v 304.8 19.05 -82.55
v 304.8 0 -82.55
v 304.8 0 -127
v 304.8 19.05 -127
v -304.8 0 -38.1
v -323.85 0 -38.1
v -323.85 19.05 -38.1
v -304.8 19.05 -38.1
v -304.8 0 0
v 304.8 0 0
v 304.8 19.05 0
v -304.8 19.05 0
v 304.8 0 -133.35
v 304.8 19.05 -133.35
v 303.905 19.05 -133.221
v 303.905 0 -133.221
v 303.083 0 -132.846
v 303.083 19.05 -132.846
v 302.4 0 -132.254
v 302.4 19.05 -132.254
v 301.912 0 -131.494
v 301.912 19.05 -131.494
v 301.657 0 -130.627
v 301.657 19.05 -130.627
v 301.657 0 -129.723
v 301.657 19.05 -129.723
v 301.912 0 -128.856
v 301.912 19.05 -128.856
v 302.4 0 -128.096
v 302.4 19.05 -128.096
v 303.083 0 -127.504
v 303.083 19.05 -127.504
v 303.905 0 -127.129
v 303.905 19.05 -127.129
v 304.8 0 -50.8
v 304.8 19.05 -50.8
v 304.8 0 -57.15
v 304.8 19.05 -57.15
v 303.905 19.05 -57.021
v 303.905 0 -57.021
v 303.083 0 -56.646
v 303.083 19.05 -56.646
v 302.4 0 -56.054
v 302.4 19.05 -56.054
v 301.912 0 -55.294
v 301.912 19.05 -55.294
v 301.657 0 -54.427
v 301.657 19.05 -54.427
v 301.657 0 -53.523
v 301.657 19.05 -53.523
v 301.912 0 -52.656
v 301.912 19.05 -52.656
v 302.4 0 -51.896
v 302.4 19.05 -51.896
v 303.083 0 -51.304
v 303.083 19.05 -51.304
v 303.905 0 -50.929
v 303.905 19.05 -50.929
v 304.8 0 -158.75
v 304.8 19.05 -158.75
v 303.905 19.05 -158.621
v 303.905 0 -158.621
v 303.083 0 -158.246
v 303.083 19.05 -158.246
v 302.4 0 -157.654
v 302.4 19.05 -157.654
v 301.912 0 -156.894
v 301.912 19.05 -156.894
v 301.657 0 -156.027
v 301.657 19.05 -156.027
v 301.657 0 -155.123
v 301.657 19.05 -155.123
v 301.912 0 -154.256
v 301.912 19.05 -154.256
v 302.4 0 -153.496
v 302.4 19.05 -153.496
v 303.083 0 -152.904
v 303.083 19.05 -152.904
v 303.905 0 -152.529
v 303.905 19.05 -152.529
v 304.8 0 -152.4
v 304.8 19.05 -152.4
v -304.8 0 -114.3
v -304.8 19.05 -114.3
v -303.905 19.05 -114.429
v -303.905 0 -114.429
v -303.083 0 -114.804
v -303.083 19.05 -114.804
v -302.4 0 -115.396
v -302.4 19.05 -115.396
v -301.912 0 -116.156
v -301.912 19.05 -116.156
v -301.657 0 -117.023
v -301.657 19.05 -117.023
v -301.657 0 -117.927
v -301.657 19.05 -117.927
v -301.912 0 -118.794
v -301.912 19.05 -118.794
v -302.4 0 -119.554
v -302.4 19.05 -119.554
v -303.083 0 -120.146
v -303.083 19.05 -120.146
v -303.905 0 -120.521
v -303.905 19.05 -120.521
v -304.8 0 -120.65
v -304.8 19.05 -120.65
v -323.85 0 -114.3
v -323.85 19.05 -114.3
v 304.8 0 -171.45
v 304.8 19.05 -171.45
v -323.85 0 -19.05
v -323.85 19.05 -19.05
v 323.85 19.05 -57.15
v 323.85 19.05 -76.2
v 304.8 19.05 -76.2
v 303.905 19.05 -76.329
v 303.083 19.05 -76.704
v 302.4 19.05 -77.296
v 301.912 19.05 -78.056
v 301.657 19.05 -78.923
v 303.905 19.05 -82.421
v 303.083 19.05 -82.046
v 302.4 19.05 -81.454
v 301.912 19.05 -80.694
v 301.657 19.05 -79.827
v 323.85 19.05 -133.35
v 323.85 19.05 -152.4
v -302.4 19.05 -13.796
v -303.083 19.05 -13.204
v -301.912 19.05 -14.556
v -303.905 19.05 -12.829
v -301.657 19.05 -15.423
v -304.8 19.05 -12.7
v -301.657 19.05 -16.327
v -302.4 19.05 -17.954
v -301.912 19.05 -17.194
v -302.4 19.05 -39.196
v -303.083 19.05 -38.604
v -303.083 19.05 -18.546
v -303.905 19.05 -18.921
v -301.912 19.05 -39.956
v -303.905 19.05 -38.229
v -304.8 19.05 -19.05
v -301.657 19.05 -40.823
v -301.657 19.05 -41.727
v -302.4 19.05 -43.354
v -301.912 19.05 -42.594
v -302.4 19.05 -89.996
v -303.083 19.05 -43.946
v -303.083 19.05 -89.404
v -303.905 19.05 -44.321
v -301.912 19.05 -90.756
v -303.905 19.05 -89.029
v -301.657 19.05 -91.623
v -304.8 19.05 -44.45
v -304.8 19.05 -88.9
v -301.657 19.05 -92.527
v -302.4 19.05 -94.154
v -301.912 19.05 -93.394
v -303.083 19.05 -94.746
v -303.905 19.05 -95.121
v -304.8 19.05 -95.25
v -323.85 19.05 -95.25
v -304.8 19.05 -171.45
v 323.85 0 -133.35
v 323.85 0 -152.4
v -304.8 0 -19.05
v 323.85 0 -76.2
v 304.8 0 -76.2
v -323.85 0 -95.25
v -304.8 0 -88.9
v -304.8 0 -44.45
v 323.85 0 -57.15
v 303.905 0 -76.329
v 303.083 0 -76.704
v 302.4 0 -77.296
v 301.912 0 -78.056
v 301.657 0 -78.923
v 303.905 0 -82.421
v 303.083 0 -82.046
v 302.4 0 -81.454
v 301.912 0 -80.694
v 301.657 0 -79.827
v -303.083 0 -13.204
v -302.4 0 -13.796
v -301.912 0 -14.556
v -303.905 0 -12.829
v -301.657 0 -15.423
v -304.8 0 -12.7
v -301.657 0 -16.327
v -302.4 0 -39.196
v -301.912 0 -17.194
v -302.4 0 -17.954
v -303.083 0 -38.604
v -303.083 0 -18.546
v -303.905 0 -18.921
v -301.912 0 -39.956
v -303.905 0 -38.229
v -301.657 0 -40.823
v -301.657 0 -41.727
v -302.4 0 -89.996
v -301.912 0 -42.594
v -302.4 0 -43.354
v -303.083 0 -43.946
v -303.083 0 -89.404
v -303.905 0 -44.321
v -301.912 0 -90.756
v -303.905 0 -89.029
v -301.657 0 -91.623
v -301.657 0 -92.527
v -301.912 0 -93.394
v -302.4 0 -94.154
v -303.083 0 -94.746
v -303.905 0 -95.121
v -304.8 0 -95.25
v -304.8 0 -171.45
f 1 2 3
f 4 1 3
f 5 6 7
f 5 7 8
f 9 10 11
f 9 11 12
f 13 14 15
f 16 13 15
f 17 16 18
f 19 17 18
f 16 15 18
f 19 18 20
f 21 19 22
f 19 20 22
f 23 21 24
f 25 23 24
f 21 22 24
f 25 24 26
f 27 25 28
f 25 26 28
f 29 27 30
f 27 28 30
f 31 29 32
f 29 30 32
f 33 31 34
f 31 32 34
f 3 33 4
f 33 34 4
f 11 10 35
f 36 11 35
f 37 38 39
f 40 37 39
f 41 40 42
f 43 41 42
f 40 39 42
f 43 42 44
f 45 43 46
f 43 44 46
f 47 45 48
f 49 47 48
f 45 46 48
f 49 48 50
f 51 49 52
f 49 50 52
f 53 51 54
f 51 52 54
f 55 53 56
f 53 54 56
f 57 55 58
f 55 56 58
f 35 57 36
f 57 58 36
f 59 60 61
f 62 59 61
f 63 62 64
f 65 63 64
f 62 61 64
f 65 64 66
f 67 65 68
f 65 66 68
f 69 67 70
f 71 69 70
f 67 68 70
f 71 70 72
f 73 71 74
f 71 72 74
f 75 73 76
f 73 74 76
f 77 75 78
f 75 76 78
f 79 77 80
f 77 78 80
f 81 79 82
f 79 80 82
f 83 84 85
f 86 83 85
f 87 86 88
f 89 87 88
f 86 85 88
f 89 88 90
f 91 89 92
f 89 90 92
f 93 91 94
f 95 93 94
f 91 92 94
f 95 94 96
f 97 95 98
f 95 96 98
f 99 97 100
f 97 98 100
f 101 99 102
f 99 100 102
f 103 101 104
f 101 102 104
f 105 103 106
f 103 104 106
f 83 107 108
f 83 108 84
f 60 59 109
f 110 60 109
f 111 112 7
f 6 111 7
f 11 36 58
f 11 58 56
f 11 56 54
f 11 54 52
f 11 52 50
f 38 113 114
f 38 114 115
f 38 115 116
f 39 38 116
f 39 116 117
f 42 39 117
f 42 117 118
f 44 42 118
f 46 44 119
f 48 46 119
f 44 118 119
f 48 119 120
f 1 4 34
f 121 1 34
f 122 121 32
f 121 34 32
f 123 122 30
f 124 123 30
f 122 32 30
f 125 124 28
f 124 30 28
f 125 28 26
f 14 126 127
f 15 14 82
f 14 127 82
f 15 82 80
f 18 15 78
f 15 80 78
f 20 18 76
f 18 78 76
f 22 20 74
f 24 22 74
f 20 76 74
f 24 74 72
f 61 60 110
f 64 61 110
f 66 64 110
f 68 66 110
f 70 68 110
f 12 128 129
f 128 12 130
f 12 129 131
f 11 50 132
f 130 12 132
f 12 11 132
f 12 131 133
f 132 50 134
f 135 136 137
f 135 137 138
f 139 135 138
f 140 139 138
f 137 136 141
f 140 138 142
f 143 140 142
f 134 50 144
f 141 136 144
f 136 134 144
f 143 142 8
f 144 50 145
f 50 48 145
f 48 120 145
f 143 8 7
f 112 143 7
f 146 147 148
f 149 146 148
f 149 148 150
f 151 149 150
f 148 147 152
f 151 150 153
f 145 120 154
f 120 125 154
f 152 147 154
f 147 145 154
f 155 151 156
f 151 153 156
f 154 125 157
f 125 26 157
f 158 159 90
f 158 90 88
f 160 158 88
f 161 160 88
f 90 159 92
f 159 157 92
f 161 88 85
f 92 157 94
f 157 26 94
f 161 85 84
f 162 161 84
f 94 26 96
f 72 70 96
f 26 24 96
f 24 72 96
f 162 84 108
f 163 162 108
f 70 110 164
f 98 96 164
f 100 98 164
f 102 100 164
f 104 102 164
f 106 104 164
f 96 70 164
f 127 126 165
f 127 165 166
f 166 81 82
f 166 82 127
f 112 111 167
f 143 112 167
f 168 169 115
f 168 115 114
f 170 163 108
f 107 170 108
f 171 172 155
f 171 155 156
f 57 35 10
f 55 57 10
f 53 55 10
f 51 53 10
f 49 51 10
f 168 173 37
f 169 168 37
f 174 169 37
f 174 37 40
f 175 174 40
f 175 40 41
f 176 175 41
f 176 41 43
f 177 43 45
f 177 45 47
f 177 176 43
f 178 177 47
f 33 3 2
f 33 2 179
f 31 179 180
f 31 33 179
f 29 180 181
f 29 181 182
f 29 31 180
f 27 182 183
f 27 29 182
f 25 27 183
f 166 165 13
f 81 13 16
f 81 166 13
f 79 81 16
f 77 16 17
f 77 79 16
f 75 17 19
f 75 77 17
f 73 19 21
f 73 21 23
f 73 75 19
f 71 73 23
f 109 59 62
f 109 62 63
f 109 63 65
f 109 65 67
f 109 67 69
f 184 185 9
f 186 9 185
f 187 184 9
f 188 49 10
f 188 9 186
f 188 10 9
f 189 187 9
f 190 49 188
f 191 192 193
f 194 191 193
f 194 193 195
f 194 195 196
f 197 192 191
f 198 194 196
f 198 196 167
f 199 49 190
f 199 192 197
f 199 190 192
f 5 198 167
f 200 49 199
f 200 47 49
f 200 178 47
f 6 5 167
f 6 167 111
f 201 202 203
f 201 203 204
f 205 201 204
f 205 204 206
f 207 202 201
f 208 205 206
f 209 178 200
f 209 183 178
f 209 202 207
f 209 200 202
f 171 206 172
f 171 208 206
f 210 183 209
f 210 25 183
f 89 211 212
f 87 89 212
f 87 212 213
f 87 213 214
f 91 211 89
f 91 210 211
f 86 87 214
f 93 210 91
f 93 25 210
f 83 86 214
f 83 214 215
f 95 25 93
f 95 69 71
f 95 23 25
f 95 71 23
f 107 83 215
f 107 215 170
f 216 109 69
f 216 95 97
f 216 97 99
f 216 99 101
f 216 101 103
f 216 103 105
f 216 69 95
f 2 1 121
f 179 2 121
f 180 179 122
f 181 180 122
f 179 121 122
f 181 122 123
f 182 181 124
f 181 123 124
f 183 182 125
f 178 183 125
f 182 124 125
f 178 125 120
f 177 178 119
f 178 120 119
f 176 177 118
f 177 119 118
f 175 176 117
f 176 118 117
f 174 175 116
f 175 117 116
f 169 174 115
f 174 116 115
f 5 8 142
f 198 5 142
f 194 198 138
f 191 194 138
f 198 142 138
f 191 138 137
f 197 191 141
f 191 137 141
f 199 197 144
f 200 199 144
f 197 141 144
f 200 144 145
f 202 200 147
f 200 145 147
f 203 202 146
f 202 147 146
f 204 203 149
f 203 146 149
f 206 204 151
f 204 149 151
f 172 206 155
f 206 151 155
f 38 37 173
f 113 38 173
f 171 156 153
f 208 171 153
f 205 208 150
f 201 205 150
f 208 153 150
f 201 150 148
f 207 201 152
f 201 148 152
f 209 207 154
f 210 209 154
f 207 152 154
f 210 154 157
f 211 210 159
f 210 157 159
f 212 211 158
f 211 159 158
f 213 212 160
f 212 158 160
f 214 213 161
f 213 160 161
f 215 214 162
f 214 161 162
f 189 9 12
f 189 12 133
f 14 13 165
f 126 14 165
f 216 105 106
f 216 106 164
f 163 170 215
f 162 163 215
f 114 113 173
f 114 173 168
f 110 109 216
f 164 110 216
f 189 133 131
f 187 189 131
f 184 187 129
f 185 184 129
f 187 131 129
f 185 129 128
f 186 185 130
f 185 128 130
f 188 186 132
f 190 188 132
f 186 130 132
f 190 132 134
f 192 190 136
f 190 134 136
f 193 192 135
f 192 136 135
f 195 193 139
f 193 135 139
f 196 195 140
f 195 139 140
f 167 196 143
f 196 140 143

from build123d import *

# Parameters (mm, degrees)
SKETCH1_W               = 304.8
SKETCH1_H               = 171.45
BOSS_EXTRUDE1_DEPTH     = 19.05
SKETCH2_W               = 19.05
SKETCH2_H               = 19.05
BOSS_EXTRUDE2_DEPTH     = 19.05
SKETCH3_W               = 19.05
SKETCH3_H               = 19.05
CUT_EXTRUDE1_DEPTH      = 367.928913415
CUT_EXTRUDE2_DEPTH      = 367.928913415
CUT_EXTRUDE2_DEPTH_BACK = 367.928913415
CUT_EXTRUDE3_DEPTH      = 367.928913415
CUT_EXTRUDE3_DEPTH_BACK = 367.928913415
CUT_EXTRUDE4_DEPTH      = 367.928913415
SKETCH9_W               = 241.3
SKETCH9_H               = 171.45
BOSS_EXTRUDE3_DEPTH     = 19.05


with BuildPart() as part:
    # Sketch1 → Boss-Extrude1 (new body)
    with BuildSketch(Plane(origin=(0, 0, 0), x_dir=(1, 0, 0), z_dir=(0, 1, 0))):
        with Locations((-152.4, 85.725)):
            Rectangle(SKETCH1_W, SKETCH1_H)
    extrude(amount=BOSS_EXTRUDE1_DEPTH)

    # Mirror1: part across plane


with BuildPart() as part_1:
    add(part.part)
    add(part.part.mirror(Plane(origin=(0, 19.05, 0), x_dir=(0, 0, 1), z_dir=(-1, 0, 0))))

    # Sketch2 → Boss-Extrude2 (add)
    with BuildSketch(Plane(origin=(0, 19.05, 0), x_dir=(1, 0, 0), z_dir=(0, 1, 0))):
        with Locations((-314.325, 28.575)):
            Rectangle(SKETCH2_W, SKETCH2_H)
        with Locations((-314.325, 104.775)):
            Rectangle(SKETCH2_W, SKETCH2_H)
        with Locations((314.325, 142.875)):
            Rectangle(SKETCH2_W, SKETCH2_H)
        with Locations((314.325, 66.675)):
            Rectangle(SKETCH2_W, SKETCH2_H)
    extrude(amount=-BOSS_EXTRUDE2_DEPTH)

    # Sketch3 → Cut-Extrude1 (cut, symmetric)
    with BuildSketch(Plane(origin=(0, 19.05, 0), x_dir=(1, 0, 0), z_dir=(0, 1, 0))):
        with Locations((-104.775, 9.525)):
            Rectangle(SKETCH3_W, SKETCH3_H)
        with Locations((-104.775, 161.925)):
            Rectangle(SKETCH3_W, SKETCH3_H)
    cut_extrude1 = extrude(amount=CUT_EXTRUDE1_DEPTH, both=True, mode=Mode.SUBTRACT)

    # Mirror2: Cut-Extrude1 across plane
    add(cut_extrude1.mirror(Plane(origin=(0, 0, 0), x_dir=(0, 0, 1), z_dir=(1, 0, 0))), mode=Mode.SUBTRACT)

    # Sketch5 → Cut-Extrude2 (cut, two sides: drawn at the far end of the back side and taken through both)
    with BuildSketch(Plane(origin=(0, 19.05, 0), x_dir=(1, 0, 0), z_dir=(0, 1, 0)).offset(-CUT_EXTRUDE2_DEPTH_BACK)):
        with BuildLine():
            Line((9.525, 131.490128061), (9.525, 141.559871939))
            ThreePointArc((9.525, 141.559871939), (9.525, 146.05), (5.034871939, 146.05))
            Line((5.034871939, 146.05), (-5.034871939, 146.05))
            ThreePointArc((-5.034871939, 146.05), (-9.525, 146.05), (-9.525, 141.559871939))
            Line((-9.525, 141.559871939), (-9.525, 131.490128061))
            ThreePointArc((-9.525, 131.490128061), (-9.525, 127), (-5.034871939, 127))
            Line((-5.034871939, 127), (5.034871939, 127))
            ThreePointArc((5.034871939, 127), (9.525, 127), (9.525, 131.490128061))
        make_face()
        with BuildLine():
            Line((9.525, 80.690128061), (9.525, 90.759871939))
            ThreePointArc((9.525, 90.759871939), (9.525, 95.25), (5.034871939, 95.25))
            Line((5.034871939, 95.25), (-5.034871939, 95.25))
            ThreePointArc((-5.034871939, 95.25), (-9.525, 95.25), (-9.525, 90.759871939))
            Line((-9.525, 90.759871939), (-9.525, 80.690128061))
            ThreePointArc((-9.525, 80.690128061), (-9.525, 76.2), (-5.034871939, 76.2))
            Line((-5.034871939, 76.2), (5.034871939, 76.2))
            ThreePointArc((5.034871939, 76.2), (9.525, 76.2), (9.525, 80.690128061))
        make_face()
        with BuildLine():
            Line((9.525, 29.890128061), (9.525, 39.959871939))
            ThreePointArc((9.525, 39.959871939), (9.525, 44.45), (5.034871939, 44.45))
            Line((5.034871939, 44.45), (-5.034871939, 44.45))
            ThreePointArc((-5.034871939, 44.45), (-9.525, 44.45), (-9.525, 39.959871939))
            Line((-9.525, 39.959871939), (-9.525, 29.890128061))
            ThreePointArc((-9.525, 29.890128061), (-9.525, 25.4), (-5.034871939, 25.4))
            Line((-5.034871939, 25.4), (5.034871939, 25.4))
            ThreePointArc((5.034871939, 25.4), (9.525, 25.4), (9.525, 29.890128061))
        make_face()
    extrude(amount=CUT_EXTRUDE2_DEPTH + CUT_EXTRUDE2_DEPTH_BACK, mode=Mode.SUBTRACT)

    # Sketch6 → Cut-Extrude3 (cut, two sides: drawn at the far end of the back side and taken through both)
    with BuildSketch(Plane(origin=(0, 19.05, 0), x_dir=(1, 0, 0), z_dir=(0, 1, 0)).offset(-CUT_EXTRUDE3_DEPTH_BACK)):
        with BuildLine():
            Line((-114.3, 166.959871939), (-114.3, 156.890128061))
            ThreePointArc((-114.3, 156.890128061), (-114.3, 152.4), (-109.809871939, 152.4))
            Line((-109.809871939, 152.4), (-99.740128061, 152.4))
            ThreePointArc((-99.740128061, 152.4), (-95.25, 152.4), (-95.25, 156.890128061))
            Line((-95.25, 156.890128061), (-95.25, 166.959871939))
            Line((-95.25, 166.959871939), (-114.3, 166.959871939))
        make_face()
        with BuildLine():
            ThreePointArc((114.3, 156.890128061), (114.3, 152.4), (109.809871939, 152.4))
            Line((109.809871939, 152.4), (99.740128061, 152.4))
            ThreePointArc((99.740128061, 152.4), (95.25, 152.4), (95.25, 156.890128061))
            Line((95.25, 156.890128061), (95.25, 166.959871939))
            Line((95.25, 166.959871939), (114.3, 166.959871939))
            Line((114.3, 166.959871939), (114.3, 156.890128061))
        make_face()
        with BuildLine():
            ThreePointArc((95.25, 14.559871939), (95.25, 19.05), (99.740128061, 19.05))
            Line((99.740128061, 19.05), (109.809871939, 19.05))
            ThreePointArc((109.809871939, 19.05), (114.3, 19.05), (114.3, 14.559871939))
            Line((114.3, 14.559871939), (114.3, 4.490128061))
            Line((114.3, 4.490128061), (95.25, 4.490128061))
            Line((95.25, 4.490128061), (95.25, 14.559871939))
        make_face()
        with BuildLine():
            Line((-95.25, 4.490128061), (-95.25, 14.559871939))
            ThreePointArc((-95.25, 14.559871939), (-95.25, 19.05), (-99.740128061, 19.05))
            Line((-99.740128061, 19.05), (-109.809871939, 19.05))
            ThreePointArc((-109.809871939, 19.05), (-114.3, 19.05), (-114.3, 14.559871939))
            Line((-114.3, 14.559871939), (-114.3, 4.490128061))
            Line((-114.3, 4.490128061), (-95.25, 4.490128061))
        make_face()
    extrude(amount=CUT_EXTRUDE3_DEPTH + CUT_EXTRUDE3_DEPTH_BACK, mode=Mode.SUBTRACT)

    # Sketch8 → Cut-Extrude4 (cut, through all)
    with BuildSketch(Plane(origin=(0, 19.05, 0), x_dir=(1, 0, 0), z_dir=(0, 1, 0))):
        with BuildLine():
            Line((-304.8, 120.65), (-304.8, 114.3))
            ThreePointArc((-304.8, 114.3), (-301.625, 117.475), (-304.8, 120.65))
        make_face()
        with BuildLine():
            Line((-304.8, 95.25), (-304.8, 88.9))
            ThreePointArc((-304.8, 88.9), (-301.625, 92.075), (-304.8, 95.25))
        make_face()
        with BuildLine():
            Line((-304.8, 44.45), (-304.8, 38.1))
            ThreePointArc((-304.8, 38.1), (-301.625, 41.275), (-304.8, 44.45))
        make_face()
        with BuildLine():
            Line((-304.8, 19.05), (-304.8, 12.7))
            ThreePointArc((-304.8, 12.7), (-301.625, 15.875), (-304.8, 19.05))
        make_face()
        with BuildLine():
            ThreePointArc((304.8, 158.75), (301.625, 155.575), (304.8, 152.4))
            Line((304.8, 152.4), (304.8, 158.75))
        make_face()
        with BuildLine():
            ThreePointArc((304.8, 133.35), (301.625, 130.175), (304.8, 127))
            Line((304.8, 127), (304.8, 133.35))
        make_face()
        with BuildLine():
            ThreePointArc((304.8, 57.15), (301.625, 53.975), (304.8, 50.8))
            Line((304.8, 50.8), (304.8, 57.15))
        make_face()
        with BuildLine():
            ThreePointArc((304.8, 82.55), (301.625, 79.375), (304.8, 76.2))
            Line((304.8, 76.2), (304.8, 82.55))
        make_face()
    extrude(amount=-CUT_EXTRUDE4_DEPTH, mode=Mode.SUBTRACT)

    # Sketch9 → Boss-Extrude3 (add)
    with BuildSketch(Plane(origin=(0, 19.05, 0), x_dir=(1, 0, 0), z_dir=(0, 1, 0))):
        with Locations((0, 85.725)):
            Rectangle(SKETCH9_W, SKETCH9_H)
    extrude(amount=-BOSS_EXTRUDE3_DEPTH)


solid = part_1.part
